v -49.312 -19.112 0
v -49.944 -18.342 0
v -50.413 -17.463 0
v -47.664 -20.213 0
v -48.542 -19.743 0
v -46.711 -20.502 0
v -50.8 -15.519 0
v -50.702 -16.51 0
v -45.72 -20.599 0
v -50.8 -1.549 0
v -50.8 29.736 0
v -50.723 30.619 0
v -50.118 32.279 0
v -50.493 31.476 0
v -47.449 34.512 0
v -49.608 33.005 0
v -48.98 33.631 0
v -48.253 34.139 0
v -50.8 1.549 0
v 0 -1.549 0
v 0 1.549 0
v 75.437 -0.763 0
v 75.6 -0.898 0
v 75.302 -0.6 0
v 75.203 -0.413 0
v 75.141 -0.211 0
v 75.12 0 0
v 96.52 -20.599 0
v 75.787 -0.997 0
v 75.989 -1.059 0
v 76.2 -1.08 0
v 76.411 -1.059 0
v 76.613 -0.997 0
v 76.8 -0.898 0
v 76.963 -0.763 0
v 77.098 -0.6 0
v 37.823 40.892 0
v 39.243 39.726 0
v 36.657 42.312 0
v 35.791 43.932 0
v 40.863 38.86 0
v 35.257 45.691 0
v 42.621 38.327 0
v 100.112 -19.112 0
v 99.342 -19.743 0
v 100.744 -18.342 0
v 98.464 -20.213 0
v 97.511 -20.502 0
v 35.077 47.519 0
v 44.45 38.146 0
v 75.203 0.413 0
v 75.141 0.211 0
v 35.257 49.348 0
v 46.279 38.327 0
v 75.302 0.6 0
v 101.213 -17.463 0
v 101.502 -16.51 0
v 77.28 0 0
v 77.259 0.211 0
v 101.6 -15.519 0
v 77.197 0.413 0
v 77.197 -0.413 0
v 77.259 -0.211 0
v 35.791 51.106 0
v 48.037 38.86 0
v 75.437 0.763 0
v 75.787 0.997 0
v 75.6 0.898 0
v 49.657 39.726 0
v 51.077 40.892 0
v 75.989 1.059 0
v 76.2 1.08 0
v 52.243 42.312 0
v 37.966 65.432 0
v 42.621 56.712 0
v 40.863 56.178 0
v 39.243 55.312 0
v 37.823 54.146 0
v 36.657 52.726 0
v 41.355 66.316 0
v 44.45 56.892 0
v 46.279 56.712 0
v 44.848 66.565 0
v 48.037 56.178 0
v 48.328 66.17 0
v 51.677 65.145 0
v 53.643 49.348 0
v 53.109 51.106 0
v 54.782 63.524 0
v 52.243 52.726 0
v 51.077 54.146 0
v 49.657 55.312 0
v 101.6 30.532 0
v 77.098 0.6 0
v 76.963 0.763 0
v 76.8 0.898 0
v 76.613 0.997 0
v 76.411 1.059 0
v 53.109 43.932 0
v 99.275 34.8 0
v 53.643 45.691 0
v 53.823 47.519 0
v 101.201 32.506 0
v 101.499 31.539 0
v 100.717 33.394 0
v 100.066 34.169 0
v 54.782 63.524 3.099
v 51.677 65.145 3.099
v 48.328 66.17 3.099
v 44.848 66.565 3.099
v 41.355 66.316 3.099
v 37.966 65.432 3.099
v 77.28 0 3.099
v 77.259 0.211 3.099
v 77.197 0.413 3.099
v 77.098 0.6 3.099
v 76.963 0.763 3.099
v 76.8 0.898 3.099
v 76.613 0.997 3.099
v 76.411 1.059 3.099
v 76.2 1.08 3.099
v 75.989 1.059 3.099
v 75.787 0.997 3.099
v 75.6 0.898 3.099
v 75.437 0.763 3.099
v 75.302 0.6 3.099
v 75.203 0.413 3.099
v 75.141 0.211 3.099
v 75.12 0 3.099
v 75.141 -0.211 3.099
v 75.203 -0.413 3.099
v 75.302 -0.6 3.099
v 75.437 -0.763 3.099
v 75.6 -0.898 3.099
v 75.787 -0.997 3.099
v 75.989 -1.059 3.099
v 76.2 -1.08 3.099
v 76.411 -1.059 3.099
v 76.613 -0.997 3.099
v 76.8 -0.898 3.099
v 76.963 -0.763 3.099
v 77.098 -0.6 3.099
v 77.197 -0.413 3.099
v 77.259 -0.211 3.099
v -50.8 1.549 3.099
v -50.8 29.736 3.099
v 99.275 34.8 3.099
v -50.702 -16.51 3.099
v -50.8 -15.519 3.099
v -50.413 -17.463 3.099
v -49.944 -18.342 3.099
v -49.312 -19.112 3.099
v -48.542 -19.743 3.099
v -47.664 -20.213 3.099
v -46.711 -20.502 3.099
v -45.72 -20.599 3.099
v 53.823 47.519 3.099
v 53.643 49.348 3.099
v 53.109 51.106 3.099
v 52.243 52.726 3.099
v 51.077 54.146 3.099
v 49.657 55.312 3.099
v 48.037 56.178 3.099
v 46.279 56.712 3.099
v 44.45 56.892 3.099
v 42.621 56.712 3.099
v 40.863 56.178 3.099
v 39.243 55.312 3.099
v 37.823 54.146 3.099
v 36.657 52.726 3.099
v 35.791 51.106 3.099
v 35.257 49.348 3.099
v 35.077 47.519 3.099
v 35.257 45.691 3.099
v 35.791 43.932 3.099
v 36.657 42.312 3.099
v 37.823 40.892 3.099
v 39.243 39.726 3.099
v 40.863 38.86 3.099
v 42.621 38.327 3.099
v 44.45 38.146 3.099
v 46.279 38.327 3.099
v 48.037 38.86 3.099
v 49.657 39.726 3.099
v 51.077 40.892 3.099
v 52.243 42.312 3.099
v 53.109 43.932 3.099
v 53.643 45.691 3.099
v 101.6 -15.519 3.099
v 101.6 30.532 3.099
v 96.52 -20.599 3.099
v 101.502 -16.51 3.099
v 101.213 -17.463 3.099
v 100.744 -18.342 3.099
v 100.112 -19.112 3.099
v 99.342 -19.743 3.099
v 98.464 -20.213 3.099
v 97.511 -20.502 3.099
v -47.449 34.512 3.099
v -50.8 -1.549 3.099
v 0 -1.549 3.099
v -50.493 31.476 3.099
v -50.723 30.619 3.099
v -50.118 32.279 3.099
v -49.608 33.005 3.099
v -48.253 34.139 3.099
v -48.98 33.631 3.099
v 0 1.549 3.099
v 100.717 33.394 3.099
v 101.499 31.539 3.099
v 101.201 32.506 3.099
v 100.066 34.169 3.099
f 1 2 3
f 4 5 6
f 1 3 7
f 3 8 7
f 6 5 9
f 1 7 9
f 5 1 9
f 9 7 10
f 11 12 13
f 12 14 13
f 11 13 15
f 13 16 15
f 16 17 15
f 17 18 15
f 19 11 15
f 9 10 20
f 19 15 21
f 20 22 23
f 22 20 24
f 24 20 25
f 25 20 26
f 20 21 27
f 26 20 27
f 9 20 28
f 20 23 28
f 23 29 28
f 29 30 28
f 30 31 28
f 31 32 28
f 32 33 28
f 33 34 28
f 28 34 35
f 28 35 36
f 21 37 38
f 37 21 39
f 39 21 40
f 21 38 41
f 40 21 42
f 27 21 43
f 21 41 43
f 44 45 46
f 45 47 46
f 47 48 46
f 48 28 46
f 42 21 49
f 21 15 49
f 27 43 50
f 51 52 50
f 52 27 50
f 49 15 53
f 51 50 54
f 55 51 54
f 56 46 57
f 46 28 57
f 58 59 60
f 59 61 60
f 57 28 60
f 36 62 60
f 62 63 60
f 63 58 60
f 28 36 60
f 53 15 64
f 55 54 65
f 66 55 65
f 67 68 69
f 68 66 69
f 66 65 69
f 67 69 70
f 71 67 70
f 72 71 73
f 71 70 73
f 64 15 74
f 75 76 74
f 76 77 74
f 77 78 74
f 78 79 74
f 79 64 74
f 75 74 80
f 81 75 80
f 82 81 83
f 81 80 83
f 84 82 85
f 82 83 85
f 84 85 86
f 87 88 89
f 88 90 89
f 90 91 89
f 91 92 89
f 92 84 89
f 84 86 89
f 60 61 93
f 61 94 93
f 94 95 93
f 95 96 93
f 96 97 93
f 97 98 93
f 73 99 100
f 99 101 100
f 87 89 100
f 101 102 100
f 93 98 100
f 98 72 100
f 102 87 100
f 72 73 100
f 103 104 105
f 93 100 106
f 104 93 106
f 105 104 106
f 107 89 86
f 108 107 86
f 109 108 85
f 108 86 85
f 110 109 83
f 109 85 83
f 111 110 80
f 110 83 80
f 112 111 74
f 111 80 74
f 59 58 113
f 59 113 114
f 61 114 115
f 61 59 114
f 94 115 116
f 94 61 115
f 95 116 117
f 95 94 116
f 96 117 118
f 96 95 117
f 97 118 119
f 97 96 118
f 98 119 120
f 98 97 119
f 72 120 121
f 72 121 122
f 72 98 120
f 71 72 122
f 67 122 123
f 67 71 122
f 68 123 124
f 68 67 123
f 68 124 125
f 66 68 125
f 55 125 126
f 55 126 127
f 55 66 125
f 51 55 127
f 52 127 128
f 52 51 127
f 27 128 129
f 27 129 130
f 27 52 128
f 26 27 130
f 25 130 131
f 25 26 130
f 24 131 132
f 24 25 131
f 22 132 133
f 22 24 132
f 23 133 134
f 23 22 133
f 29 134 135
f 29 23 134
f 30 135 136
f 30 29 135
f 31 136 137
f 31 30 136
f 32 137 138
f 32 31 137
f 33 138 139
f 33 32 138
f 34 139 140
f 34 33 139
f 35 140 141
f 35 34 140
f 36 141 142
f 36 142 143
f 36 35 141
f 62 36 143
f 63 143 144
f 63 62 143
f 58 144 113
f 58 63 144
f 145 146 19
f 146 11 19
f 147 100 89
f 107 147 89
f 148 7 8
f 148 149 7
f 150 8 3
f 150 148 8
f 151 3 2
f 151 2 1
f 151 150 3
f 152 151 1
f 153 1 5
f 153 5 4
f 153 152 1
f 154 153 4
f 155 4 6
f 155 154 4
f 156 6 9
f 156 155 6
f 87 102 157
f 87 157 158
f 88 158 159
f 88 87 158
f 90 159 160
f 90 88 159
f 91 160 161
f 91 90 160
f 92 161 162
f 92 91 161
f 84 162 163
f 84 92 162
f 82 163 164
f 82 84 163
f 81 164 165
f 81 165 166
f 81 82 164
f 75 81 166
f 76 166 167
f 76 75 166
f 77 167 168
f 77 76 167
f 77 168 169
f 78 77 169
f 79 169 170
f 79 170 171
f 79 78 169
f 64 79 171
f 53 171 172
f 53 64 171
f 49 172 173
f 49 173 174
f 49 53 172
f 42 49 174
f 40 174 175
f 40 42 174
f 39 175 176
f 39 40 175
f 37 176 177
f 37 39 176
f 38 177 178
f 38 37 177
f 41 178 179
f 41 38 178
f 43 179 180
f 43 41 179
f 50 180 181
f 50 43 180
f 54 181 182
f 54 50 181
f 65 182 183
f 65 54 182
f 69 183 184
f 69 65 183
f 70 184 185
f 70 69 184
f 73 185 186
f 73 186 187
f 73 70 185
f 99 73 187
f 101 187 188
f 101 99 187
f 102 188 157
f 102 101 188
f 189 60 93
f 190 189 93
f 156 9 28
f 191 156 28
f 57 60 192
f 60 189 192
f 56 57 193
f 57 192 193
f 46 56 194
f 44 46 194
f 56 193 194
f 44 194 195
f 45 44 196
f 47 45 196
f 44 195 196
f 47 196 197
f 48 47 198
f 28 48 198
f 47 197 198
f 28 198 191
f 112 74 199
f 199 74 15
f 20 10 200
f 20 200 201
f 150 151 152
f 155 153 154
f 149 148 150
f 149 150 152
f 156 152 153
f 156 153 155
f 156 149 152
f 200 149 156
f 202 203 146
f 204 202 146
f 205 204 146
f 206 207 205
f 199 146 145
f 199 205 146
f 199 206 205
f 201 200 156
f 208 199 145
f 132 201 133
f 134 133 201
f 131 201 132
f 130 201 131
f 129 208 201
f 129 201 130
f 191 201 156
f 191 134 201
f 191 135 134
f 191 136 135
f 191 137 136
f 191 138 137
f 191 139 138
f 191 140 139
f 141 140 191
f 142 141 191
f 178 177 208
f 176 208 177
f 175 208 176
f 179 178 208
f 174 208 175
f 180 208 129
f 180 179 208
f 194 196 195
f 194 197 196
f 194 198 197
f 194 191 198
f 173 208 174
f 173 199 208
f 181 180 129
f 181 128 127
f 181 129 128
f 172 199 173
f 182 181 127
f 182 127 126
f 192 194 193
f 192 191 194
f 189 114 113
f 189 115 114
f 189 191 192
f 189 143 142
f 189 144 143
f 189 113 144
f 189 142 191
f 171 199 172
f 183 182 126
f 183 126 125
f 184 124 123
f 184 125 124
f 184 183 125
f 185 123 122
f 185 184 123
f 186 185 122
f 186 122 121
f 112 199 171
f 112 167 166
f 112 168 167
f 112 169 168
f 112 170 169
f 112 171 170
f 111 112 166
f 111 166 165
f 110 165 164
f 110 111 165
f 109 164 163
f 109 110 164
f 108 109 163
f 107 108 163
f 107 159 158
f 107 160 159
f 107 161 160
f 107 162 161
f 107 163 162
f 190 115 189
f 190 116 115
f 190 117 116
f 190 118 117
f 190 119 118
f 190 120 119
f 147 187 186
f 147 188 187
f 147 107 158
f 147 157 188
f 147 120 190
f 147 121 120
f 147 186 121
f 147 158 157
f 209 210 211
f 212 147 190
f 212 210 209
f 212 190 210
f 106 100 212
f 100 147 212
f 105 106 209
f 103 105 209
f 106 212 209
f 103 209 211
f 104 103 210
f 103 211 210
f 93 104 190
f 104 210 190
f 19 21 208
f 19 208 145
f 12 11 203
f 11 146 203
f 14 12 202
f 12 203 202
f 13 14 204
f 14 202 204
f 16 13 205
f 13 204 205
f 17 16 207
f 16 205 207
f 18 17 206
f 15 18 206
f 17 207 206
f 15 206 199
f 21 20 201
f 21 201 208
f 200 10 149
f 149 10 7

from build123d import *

# Parameters (mm, degrees)
BOSS_EXTRUDE1_DEPTH = 3.0988
SKETCH3_R           = 1.0795
SKETCH3_R_2         = 9.3726
BOSS_EXTRUDE2_DEPTH = 3.0988
FILLET1_R           = 5.08


with BuildPart() as part:
    # Sketch2 → Boss-Extrude1 (new body)
    with BuildSketch(Plane.XY):
        Polygon((-50.8, 1.5494), (-50.8, 7.8994), (50.8, 7.8994), (50.8, -7.8994), (-50.8, -7.8994), (-50.8, -1.5494), (0, -1.5494), (0, 1.5494), align=None)
    extrude(amount=BOSS_EXTRUDE1_DEPTH)

    # Sketch3 → Boss-Extrude2 (add)
    with BuildSketch(Plane.XY):
        with BuildLine():
            Line((50.8, -7.8994), (-50.8, -7.8994))
            Line((-50.8, -7.8994), (-50.8, -20.5994))
            Line((-50.8, -20.5994), (101.6, -20.5994))
            Line((101.6, -20.5994), (101.6, 33.2994))
            Line((101.6, 33.2994), (54.782161872, 63.523702231))
            ThreePointArc((54.782161872, 63.523702231), (46.597523005, 66.447615713), (37.96588061, 65.431577828))
            Line((37.96588061, 65.431577828), (-50.8, 33.2994))
            Line((-50.8, 33.2994), (-50.8, 7.8994))
            Line((-50.8, 7.8994), (50.8, 7.8994))
            Line((50.8, 7.8994), (50.8, -7.8994))
        make_face()
        with Locations((76.2, 0)):
            Circle(SKETCH3_R, mode=Mode.SUBTRACT)
        with Locations((44.45, 47.519048812)):
            Circle(SKETCH3_R_2, mode=Mode.SUBTRACT)
    extrude(amount=BOSS_EXTRUDE2_DEPTH)

    # Fillet1
    fillet1_edges = [part.edges().sort_by_distance(p)[0] for p in [
        (101.6, 33.2994, 1.5494),
        (-50.8, 33.2994, 1.5494),
        (-50.8, -20.5994, 1.5494),
        (101.6, -20.5994, 1.5494),
    ]]
    fillet(fillet1_edges, radius=FILLET1_R)


solid = part.part
